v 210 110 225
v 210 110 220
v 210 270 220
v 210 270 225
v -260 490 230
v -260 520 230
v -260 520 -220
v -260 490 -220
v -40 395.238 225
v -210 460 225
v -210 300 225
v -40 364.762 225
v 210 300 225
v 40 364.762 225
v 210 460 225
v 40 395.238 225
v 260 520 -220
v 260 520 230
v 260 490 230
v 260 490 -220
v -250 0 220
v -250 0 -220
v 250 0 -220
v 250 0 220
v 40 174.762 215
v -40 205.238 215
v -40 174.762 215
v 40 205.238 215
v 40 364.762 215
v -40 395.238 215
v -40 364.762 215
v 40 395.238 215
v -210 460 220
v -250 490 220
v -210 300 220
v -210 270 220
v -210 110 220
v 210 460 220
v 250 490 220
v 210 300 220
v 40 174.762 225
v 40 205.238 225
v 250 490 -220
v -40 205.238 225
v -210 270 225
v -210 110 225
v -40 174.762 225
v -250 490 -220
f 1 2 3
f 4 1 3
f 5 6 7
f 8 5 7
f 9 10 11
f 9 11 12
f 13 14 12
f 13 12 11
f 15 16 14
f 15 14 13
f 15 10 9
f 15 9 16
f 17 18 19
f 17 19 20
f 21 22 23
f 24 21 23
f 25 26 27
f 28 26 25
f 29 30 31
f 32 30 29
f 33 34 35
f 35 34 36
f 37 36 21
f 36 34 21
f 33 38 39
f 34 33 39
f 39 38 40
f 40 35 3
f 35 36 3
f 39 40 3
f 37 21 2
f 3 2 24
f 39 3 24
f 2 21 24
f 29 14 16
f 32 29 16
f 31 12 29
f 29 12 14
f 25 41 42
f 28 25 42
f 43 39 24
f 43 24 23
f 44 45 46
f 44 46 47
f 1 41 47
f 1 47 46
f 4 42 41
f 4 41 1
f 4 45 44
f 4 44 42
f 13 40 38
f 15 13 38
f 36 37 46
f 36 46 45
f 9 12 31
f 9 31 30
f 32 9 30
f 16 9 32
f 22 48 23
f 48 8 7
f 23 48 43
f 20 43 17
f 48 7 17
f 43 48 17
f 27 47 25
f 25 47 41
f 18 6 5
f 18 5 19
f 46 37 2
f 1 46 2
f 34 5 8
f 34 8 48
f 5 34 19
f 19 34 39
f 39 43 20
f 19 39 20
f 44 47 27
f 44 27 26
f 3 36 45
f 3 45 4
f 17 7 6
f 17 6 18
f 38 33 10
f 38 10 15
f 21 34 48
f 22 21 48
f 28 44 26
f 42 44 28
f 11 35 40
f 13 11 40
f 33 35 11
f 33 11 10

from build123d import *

# Parameters (mm, degrees)
SKETCH_1_W             = 500
SKETCH_1_H             = 440
EXTRUDE_1_DEPTH        = 520
SKETCH_2_W             = 520
SKETCH_2_H             = 450
EXTRUDE_2_DEPTH        = 30
SKETCH_3_W             = 420
SKETCH_3_H             = 160
EXTRUDE_3_DEPTH        = 5
SKETCH_4_W             = 80
SKETCH_4_H             = 30.476190476
CUT_EXTRUDE_2_DEPTH    = 10
PATTERN_LINEAR_1_COUNT = 2
PATTERN_LINEAR_1_PITCH = 190


with BuildPart() as part:
    # 草图1 → 凸台-拉伸1 (new body)
    with BuildSketch(Plane(origin=(0, 0, 0), x_dir=(1, 0, 0), z_dir=(0, 1, 0))):
        Rectangle(SKETCH_1_W, SKETCH_1_H)
    extrude(amount=EXTRUDE_1_DEPTH)

    # 草图2 → 凸台-拉伸2 (add)
    with BuildSketch(Plane(origin=(0, 520, 0), x_dir=(1, 0, 0), z_dir=(0, 1, 0))):
        with Locations((0, -5)):
            Rectangle(SKETCH_2_W, SKETCH_2_H)
    extrude(amount=-EXTRUDE_2_DEPTH)

    # 草图3 → 凸台-拉伸3 (add)
    with BuildSketch(Plane.XY.offset(220)):
        with Locations((0, 380)):
            Rectangle(SKETCH_3_W, SKETCH_3_H)
    extrude_3 = extrude(amount=EXTRUDE_3_DEPTH)

    # 草图4 → 切除-拉伸2 (cut)
    with BuildSketch(Plane.XY.offset(225)):
        with Locations((0, 380)):
            Rectangle(SKETCH_4_W, SKETCH_4_H)
    cut_extrude_2 = extrude(amount=-CUT_EXTRUDE_2_DEPTH, mode=Mode.SUBTRACT)

    # 阵列(线性)1: 凸台-拉伸3, 切除-拉伸2 ×2
    with Locations(*[(0, -i * PATTERN_LINEAR_1_PITCH, 0) for i in range(1, PATTERN_LINEAR_1_COUNT)]):
        add(extrude_3)
        add(cut_extrude_2, mode=Mode.SUBTRACT)


solid = part.part
